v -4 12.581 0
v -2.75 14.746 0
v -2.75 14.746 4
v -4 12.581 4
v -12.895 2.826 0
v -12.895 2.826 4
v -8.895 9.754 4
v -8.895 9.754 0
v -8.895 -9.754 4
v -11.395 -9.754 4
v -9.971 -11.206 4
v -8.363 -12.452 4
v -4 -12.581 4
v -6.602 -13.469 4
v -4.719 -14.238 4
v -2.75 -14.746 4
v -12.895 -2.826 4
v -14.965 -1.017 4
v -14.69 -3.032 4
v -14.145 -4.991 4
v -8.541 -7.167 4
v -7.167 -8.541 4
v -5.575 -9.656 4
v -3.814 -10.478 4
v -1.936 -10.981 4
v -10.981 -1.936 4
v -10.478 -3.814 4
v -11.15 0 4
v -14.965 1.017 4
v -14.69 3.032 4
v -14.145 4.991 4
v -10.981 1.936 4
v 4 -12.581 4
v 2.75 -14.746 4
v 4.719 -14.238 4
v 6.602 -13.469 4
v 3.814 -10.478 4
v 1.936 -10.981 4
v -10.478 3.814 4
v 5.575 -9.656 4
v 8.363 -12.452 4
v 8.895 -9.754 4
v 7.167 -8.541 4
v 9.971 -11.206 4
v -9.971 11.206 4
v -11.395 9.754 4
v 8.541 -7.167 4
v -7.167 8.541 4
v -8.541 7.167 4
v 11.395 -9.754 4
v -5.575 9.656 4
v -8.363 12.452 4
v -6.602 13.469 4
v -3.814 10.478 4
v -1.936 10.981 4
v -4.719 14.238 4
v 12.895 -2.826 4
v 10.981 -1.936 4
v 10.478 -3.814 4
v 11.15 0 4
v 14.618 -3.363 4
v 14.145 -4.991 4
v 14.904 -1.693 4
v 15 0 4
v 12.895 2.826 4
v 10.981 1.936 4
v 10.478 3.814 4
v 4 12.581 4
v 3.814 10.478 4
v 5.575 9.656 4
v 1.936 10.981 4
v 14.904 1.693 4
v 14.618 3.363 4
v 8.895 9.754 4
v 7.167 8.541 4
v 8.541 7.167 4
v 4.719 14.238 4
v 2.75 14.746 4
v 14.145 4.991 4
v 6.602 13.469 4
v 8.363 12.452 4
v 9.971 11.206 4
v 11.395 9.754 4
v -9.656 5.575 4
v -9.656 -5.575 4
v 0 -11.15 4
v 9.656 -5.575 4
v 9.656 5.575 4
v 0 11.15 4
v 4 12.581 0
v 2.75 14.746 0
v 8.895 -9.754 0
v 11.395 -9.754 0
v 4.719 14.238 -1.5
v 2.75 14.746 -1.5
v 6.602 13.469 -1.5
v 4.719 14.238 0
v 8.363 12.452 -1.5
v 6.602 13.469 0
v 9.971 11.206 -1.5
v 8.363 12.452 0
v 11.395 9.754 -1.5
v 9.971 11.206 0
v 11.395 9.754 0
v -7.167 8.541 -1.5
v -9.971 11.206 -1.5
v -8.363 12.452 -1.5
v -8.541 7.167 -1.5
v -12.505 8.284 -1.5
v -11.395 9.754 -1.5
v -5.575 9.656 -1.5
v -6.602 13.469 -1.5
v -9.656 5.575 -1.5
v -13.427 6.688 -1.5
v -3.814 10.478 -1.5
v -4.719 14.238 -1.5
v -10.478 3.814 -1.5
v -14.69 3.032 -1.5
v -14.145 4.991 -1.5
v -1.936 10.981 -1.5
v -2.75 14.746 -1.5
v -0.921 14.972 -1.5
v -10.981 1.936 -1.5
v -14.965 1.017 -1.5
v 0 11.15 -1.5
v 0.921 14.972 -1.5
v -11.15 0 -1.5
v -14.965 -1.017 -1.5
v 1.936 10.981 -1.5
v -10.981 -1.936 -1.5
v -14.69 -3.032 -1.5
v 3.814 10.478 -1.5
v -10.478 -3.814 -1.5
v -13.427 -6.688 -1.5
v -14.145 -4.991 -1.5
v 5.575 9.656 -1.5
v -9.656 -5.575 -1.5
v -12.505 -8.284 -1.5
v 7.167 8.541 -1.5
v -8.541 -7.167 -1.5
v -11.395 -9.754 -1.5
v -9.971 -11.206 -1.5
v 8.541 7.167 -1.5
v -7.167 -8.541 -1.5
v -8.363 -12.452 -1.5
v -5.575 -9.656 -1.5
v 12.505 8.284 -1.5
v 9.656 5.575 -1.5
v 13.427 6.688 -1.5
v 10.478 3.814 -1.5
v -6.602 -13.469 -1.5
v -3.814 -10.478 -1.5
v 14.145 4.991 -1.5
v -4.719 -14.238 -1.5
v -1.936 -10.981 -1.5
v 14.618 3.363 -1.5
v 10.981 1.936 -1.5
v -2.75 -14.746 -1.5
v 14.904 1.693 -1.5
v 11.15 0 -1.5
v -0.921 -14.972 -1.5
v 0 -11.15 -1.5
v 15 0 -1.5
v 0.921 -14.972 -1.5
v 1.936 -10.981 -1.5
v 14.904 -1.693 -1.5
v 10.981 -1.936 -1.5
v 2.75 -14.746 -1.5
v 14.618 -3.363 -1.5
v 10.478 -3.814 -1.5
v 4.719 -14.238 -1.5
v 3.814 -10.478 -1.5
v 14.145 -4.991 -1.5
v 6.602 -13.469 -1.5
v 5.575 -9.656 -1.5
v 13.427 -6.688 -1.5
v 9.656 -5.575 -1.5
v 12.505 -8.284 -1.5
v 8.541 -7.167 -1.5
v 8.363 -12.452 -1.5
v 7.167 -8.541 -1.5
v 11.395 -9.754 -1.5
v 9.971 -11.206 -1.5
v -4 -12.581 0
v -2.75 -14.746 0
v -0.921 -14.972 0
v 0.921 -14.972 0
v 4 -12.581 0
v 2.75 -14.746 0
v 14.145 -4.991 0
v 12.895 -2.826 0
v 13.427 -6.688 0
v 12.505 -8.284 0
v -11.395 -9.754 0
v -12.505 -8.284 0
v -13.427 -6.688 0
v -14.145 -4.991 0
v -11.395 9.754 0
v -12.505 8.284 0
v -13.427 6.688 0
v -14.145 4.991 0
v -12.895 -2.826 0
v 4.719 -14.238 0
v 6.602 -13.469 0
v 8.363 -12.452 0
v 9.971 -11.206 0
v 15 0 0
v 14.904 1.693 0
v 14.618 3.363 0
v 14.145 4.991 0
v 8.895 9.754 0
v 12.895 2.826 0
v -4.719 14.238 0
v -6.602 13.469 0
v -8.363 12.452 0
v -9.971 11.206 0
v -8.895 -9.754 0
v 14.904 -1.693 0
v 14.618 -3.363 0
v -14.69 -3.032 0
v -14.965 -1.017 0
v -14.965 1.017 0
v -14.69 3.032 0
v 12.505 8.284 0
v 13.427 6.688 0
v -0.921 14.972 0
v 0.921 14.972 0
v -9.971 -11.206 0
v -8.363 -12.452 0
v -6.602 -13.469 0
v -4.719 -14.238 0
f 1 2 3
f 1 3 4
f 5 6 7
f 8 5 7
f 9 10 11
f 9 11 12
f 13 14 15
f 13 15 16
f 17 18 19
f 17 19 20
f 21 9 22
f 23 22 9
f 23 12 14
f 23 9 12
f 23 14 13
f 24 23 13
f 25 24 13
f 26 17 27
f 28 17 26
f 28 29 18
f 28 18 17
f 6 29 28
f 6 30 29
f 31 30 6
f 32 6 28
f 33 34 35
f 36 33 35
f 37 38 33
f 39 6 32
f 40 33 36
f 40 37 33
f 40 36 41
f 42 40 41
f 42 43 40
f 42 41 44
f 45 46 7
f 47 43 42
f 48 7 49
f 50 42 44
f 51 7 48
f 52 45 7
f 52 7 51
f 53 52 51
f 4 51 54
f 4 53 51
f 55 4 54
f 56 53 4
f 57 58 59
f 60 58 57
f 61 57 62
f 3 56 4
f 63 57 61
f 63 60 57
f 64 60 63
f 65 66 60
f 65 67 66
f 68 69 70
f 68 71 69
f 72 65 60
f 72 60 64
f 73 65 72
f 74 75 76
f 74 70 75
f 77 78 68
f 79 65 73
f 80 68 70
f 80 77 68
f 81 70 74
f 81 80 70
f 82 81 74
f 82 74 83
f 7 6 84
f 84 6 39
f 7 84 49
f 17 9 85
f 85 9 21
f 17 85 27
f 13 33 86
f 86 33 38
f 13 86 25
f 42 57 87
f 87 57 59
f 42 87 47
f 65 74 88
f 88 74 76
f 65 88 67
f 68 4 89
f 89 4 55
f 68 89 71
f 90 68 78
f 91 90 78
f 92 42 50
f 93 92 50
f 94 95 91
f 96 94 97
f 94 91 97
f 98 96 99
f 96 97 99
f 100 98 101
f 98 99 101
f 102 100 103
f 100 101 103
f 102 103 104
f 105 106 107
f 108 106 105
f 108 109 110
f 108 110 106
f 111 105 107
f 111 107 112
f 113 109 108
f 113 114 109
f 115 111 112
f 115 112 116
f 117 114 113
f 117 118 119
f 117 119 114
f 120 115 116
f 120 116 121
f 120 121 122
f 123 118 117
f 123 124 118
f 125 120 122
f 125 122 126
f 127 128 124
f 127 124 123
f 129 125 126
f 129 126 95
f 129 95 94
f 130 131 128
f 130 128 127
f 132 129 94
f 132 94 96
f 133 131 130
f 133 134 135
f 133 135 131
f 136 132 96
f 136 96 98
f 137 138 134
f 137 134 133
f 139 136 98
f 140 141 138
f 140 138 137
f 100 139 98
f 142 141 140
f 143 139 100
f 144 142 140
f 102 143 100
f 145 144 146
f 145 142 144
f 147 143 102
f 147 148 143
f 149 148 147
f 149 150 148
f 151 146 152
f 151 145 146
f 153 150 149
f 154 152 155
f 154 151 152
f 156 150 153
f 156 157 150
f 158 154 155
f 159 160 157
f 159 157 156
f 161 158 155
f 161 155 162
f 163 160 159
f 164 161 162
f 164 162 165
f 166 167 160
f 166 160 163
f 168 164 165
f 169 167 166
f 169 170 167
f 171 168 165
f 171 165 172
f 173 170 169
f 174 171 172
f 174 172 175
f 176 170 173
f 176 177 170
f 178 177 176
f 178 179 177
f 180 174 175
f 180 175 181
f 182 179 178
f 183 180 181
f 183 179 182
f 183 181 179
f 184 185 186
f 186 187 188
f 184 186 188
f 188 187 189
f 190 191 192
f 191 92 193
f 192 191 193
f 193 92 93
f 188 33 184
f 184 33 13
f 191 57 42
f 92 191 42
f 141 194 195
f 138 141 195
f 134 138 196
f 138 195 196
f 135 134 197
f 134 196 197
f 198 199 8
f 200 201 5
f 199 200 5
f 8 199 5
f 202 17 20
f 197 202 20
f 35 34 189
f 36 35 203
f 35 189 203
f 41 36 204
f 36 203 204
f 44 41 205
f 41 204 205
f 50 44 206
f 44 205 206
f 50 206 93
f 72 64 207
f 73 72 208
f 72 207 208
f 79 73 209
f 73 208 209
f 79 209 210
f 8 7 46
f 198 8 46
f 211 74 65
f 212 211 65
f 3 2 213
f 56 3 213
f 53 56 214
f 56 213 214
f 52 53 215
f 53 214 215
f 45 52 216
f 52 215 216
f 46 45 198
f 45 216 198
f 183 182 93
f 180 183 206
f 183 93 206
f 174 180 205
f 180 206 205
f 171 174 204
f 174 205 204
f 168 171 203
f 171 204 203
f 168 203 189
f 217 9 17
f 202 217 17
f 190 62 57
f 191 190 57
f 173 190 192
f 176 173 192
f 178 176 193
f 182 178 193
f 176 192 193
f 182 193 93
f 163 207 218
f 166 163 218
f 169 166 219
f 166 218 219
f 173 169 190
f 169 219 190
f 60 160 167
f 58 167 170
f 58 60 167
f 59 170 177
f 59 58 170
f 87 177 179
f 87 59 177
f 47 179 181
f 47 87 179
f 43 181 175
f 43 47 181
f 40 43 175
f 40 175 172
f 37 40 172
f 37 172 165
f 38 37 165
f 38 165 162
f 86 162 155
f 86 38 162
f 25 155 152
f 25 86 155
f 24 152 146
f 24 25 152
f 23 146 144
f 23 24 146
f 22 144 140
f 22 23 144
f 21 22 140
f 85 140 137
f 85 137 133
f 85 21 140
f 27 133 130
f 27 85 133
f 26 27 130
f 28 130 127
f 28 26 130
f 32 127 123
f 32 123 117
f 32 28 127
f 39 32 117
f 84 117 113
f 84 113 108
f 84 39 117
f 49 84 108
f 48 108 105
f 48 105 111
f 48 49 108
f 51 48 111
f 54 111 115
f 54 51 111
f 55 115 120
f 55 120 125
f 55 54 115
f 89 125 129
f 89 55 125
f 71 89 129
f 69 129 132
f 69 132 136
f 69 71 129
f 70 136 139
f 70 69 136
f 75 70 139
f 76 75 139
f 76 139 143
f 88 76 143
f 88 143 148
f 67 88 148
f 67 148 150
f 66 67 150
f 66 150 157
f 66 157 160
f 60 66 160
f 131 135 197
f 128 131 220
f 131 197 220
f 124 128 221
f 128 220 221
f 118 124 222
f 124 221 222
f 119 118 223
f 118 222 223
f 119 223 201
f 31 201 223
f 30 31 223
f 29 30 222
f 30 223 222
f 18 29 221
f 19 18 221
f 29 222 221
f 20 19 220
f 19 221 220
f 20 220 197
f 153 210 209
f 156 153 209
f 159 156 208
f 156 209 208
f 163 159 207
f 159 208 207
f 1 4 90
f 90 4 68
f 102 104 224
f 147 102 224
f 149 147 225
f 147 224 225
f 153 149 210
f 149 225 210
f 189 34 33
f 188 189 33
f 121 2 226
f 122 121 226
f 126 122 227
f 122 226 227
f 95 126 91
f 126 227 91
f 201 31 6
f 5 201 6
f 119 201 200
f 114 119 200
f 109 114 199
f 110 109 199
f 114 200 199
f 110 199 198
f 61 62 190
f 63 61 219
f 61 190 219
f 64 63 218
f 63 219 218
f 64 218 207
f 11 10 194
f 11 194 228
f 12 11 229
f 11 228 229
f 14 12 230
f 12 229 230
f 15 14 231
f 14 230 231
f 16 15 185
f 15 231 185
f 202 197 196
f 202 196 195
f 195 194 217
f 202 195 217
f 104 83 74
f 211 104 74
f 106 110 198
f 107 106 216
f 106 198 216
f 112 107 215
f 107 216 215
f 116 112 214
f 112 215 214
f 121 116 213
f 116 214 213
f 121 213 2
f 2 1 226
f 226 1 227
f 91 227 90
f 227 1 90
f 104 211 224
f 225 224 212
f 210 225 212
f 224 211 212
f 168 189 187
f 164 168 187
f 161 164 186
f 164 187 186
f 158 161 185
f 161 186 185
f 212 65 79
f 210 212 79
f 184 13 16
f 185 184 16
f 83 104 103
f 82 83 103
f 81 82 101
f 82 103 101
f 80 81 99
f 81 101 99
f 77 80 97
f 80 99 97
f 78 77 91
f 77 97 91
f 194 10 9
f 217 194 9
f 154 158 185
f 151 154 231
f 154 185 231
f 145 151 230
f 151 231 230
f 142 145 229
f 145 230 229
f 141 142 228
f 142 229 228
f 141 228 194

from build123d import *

# Parameters (mm, degrees)
F0_R     = 11.15
F1_DEPTH = 4
F3_DEPTH = 16.2
F4_R     = 11.15
F5_DEPTH = 1.5


with BuildPart() as f1:
    # F0 (on Top) → F1 (new body)
    with BuildSketch(Plane.XY):
        with BuildLine():
            ThreePointArc((-2.75, 14.7457621031), (-9.5851447563, -11.5379807592), (15, 0))
            ThreePointArc((15, 0), (11.5379807592, 9.5851447563), (2.75, 14.7457621031))
            Line((2.75, 14.7457621031), (4, 12.5806985936))
            Line((4, 12.5806985936), (0, 12.5806985936))
            Line((0, 12.5806985936), (-4, 12.5806985936))
            Line((-4, 12.5806985936), (-2.75, 14.7457621031))
        make_face()
        Circle(F0_R, mode=Mode.SUBTRACT)
        with BuildLine():
            Line((4, 12.5806985936), (2.75, 14.7457621031))
            ThreePointArc((2.75, 14.7457621031), (0, 15), (-2.75, 14.7457621031))
            Line((-2.75, 14.7457621031), (-4, 12.5806985936))
            Line((-4, 12.5806985936), (0, 12.5806985936))
            Line((0, 12.5806985936), (4, 12.5806985936))
        make_face()
    extrude(amount=F1_DEPTH)

    # F2 (on face) → F3 (cut)
    with BuildSketch(Plane.XY.offset(4)):
        with BuildLine():
            ThreePointArc((-11.3952045794, 9.7544509119), (-12.9903810568, 7.5), (-14.1452045794, 4.9913111911))
            Line((-14.1452045794, 4.9913111911), (-12.8952045794, 2.8262476817))
            Line((-12.8952045794, 2.8262476817), (-8.8952045794, 9.7544509119))
            Line((-8.8952045794, 9.7544509119), (-11.3952045794, 9.7544509119))
        make_face()
        with BuildLine():
            Line((-12.8952045794, -2.8262476817), (-14.1452045794, -4.9913111911))
            ThreePointArc((-14.1452045794, -4.9913111911), (-12.9903810568, -7.5), (-11.3952045794, -9.7544509119))
            Line((-11.3952045794, -9.7544509119), (-8.8952045794, -9.7544509119))
            Line((-8.8952045794, -9.7544509119), (-12.8952045794, -2.8262476817))
        make_face()
        with BuildLine():
            Line((-4, -12.5806985936), (-2.75, -14.7457621031))
            ThreePointArc((-2.75, -14.7457621031), (0, -15), (2.75, -14.7457621031))
            Line((2.75, -14.7457621031), (4, -12.5806985936))
            Line((4, -12.5806985936), (-4, -12.5806985936))
        make_face()
        with BuildLine():
            Line((8.8952045794, -9.7544509119), (11.3952045794, -9.7544509119))
            ThreePointArc((11.3952045794, -9.7544509119), (12.9903810568, -7.5), (14.1452045794, -4.9913111911))
            Line((14.1452045794, -4.9913111911), (12.8952045794, -2.8262476817))
            Line((12.8952045794, -2.8262476817), (8.8952045794, -9.7544509119))
        make_face()
        with BuildLine():
            ThreePointArc((14.1452045794, 4.9913111911), (12.9903810568, 7.5), (11.3952045794, 9.7544509119))
            Line((11.3952045794, 9.7544509119), (8.8952045794, 9.7544509119))
            Line((8.8952045794, 9.7544509119), (12.8952045794, 2.8262476817))
            Line((12.8952045794, 2.8262476817), (14.1452045794, 4.9913111911))
        make_face()
        with BuildLine():
            ThreePointArc((2.75, 14.7457621031), (0, 15), (-2.75, 14.7457621031))
            Line((-2.75, 14.7457621031), (-4, 12.5806985936))
            Line((-4, 12.5806985936), (4, 12.5806985936))
            Line((4, 12.5806985936), (2.75, 14.7457621031))
        make_face()
    extrude(amount=-F3_DEPTH, mode=Mode.SUBTRACT)

    # F4 (on face) → F5 (join)
    with BuildSketch(Plane(origin=(0, 0, 0), x_dir=(1, 0, 0), z_dir=(0, 0, -1))):
        with BuildLine():
            ThreePointArc((14.1452045794, -4.9913111911), (14.784756824, -2.5319884783), (15, 0))
            ThreePointArc((15, 0), (14.784756824, 2.5319884783), (14.1452045794, 4.9913111911))
            Line((14.1452045794, 4.9913111911), (12.8952045794, 2.8262476817))
            Line((12.8952045794, 2.8262476817), (8.8952045794, 9.7544509119))
            Line((8.8952045794, 9.7544509119), (11.3952045794, 9.7544509119))
            ThreePointArc((11.3952045794, 9.7544509119), (7.5, 12.9903810568), (2.75, 14.7457621031))
            Line((2.75, 14.7457621031), (4, 12.5806985936))
            Line((4, 12.5806985936), (-4, 12.5806985936))
            Line((-4, 12.5806985936), (-2.75, 14.7457621031))
            ThreePointArc((-2.75, 14.7457621031), (-7.5, 12.9903810568), (-11.3952045794, 9.7544509119))
            Line((-11.3952045794, 9.7544509119), (-8.8952045794, 9.7544509119))
            Line((-8.8952045794, 9.7544509119), (-12.8952045794, 2.8262476817))
            Line((-12.8952045794, 2.8262476817), (-14.1452045794, 4.9913111911))
            ThreePointArc((-14.1452045794, 4.9913111911), (-15, 0), (-14.1452045794, -4.9913111911))
            Line((-14.1452045794, -4.9913111911), (-12.8952045794, -2.8262476817))
            Line((-12.8952045794, -2.8262476817), (-8.8952045794, -9.7544509119))
            Line((-8.8952045794, -9.7544509119), (-11.3952045794, -9.7544509119))
            ThreePointArc((-11.3952045794, -9.7544509119), (-7.5, -12.9903810568), (-2.75, -14.7457621031))
            Line((-2.75, -14.7457621031), (-4, -12.5806985936))
            Line((-4, -12.5806985936), (4, -12.5806985936))
            Line((4, -12.5806985936), (2.75, -14.7457621031))
            ThreePointArc((2.75, -14.7457621031), (7.5, -12.9903810568), (11.3952045794, -9.7544509119))
            Line((11.3952045794, -9.7544509119), (8.8952045794, -9.7544509119))
            Line((8.8952045794, -9.7544509119), (12.8952045794, -2.8262476817))
            Line((12.8952045794, -2.8262476817), (14.1452045794, -4.9913111911))
        make_face()
        Circle(F4_R, mode=Mode.SUBTRACT)
        with BuildLine():
            Line((12.8952045794, 2.8262476817), (14.1452045794, 4.9913111911))
            ThreePointArc((14.1452045794, 4.9913111911), (12.9903810568, 7.5), (11.3952045794, 9.7544509119))
            Line((11.3952045794, 9.7544509119), (8.8952045794, 9.7544509119))
            Line((8.8952045794, 9.7544509119), (12.8952045794, 2.8262476817))
        make_face()
        with BuildLine():
            ThreePointArc((11.3952045794, -9.7544509119), (12.9903810568, -7.5), (14.1452045794, -4.9913111911))
            Line((14.1452045794, -4.9913111911), (12.8952045794, -2.8262476817))
            Line((12.8952045794, -2.8262476817), (8.8952045794, -9.7544509119))
            Line((8.8952045794, -9.7544509119), (11.3952045794, -9.7544509119))
        make_face()
        with BuildLine():
            Line((4, 12.5806985936), (2.75, 14.7457621031))
            ThreePointArc((2.75, 14.7457621031), (0, 15), (-2.75, 14.7457621031))
            Line((-2.75, 14.7457621031), (-4, 12.5806985936))
            Line((-4, 12.5806985936), (4, 12.5806985936))
        make_face()
        with BuildLine():
            ThreePointArc((-2.75, -14.7457621031), (0, -15), (2.75, -14.7457621031))
            Line((2.75, -14.7457621031), (4, -12.5806985936))
            Line((4, -12.5806985936), (-4, -12.5806985936))
            Line((-4, -12.5806985936), (-2.75, -14.7457621031))
        make_face()
        with BuildLine():
            Line((-8.8952045794, 9.7544509119), (-11.3952045794, 9.7544509119))
            ThreePointArc((-11.3952045794, 9.7544509119), (-12.9903810568, 7.5), (-14.1452045794, 4.9913111911))
            Line((-14.1452045794, 4.9913111911), (-12.8952045794, 2.8262476817))
            Line((-12.8952045794, 2.8262476817), (-8.8952045794, 9.7544509119))
        make_face()
        with BuildLine():
            ThreePointArc((-14.1452045794, -4.9913111911), (-12.9903810568, -7.5), (-11.3952045794, -9.7544509119))
            Line((-11.3952045794, -9.7544509119), (-8.8952045794, -9.7544509119))
            Line((-8.8952045794, -9.7544509119), (-12.8952045794, -2.8262476817))
            Line((-12.8952045794, -2.8262476817), (-14.1452045794, -4.9913111911))
        make_face()
    extrude(amount=F5_DEPTH)


solid = f1.part
